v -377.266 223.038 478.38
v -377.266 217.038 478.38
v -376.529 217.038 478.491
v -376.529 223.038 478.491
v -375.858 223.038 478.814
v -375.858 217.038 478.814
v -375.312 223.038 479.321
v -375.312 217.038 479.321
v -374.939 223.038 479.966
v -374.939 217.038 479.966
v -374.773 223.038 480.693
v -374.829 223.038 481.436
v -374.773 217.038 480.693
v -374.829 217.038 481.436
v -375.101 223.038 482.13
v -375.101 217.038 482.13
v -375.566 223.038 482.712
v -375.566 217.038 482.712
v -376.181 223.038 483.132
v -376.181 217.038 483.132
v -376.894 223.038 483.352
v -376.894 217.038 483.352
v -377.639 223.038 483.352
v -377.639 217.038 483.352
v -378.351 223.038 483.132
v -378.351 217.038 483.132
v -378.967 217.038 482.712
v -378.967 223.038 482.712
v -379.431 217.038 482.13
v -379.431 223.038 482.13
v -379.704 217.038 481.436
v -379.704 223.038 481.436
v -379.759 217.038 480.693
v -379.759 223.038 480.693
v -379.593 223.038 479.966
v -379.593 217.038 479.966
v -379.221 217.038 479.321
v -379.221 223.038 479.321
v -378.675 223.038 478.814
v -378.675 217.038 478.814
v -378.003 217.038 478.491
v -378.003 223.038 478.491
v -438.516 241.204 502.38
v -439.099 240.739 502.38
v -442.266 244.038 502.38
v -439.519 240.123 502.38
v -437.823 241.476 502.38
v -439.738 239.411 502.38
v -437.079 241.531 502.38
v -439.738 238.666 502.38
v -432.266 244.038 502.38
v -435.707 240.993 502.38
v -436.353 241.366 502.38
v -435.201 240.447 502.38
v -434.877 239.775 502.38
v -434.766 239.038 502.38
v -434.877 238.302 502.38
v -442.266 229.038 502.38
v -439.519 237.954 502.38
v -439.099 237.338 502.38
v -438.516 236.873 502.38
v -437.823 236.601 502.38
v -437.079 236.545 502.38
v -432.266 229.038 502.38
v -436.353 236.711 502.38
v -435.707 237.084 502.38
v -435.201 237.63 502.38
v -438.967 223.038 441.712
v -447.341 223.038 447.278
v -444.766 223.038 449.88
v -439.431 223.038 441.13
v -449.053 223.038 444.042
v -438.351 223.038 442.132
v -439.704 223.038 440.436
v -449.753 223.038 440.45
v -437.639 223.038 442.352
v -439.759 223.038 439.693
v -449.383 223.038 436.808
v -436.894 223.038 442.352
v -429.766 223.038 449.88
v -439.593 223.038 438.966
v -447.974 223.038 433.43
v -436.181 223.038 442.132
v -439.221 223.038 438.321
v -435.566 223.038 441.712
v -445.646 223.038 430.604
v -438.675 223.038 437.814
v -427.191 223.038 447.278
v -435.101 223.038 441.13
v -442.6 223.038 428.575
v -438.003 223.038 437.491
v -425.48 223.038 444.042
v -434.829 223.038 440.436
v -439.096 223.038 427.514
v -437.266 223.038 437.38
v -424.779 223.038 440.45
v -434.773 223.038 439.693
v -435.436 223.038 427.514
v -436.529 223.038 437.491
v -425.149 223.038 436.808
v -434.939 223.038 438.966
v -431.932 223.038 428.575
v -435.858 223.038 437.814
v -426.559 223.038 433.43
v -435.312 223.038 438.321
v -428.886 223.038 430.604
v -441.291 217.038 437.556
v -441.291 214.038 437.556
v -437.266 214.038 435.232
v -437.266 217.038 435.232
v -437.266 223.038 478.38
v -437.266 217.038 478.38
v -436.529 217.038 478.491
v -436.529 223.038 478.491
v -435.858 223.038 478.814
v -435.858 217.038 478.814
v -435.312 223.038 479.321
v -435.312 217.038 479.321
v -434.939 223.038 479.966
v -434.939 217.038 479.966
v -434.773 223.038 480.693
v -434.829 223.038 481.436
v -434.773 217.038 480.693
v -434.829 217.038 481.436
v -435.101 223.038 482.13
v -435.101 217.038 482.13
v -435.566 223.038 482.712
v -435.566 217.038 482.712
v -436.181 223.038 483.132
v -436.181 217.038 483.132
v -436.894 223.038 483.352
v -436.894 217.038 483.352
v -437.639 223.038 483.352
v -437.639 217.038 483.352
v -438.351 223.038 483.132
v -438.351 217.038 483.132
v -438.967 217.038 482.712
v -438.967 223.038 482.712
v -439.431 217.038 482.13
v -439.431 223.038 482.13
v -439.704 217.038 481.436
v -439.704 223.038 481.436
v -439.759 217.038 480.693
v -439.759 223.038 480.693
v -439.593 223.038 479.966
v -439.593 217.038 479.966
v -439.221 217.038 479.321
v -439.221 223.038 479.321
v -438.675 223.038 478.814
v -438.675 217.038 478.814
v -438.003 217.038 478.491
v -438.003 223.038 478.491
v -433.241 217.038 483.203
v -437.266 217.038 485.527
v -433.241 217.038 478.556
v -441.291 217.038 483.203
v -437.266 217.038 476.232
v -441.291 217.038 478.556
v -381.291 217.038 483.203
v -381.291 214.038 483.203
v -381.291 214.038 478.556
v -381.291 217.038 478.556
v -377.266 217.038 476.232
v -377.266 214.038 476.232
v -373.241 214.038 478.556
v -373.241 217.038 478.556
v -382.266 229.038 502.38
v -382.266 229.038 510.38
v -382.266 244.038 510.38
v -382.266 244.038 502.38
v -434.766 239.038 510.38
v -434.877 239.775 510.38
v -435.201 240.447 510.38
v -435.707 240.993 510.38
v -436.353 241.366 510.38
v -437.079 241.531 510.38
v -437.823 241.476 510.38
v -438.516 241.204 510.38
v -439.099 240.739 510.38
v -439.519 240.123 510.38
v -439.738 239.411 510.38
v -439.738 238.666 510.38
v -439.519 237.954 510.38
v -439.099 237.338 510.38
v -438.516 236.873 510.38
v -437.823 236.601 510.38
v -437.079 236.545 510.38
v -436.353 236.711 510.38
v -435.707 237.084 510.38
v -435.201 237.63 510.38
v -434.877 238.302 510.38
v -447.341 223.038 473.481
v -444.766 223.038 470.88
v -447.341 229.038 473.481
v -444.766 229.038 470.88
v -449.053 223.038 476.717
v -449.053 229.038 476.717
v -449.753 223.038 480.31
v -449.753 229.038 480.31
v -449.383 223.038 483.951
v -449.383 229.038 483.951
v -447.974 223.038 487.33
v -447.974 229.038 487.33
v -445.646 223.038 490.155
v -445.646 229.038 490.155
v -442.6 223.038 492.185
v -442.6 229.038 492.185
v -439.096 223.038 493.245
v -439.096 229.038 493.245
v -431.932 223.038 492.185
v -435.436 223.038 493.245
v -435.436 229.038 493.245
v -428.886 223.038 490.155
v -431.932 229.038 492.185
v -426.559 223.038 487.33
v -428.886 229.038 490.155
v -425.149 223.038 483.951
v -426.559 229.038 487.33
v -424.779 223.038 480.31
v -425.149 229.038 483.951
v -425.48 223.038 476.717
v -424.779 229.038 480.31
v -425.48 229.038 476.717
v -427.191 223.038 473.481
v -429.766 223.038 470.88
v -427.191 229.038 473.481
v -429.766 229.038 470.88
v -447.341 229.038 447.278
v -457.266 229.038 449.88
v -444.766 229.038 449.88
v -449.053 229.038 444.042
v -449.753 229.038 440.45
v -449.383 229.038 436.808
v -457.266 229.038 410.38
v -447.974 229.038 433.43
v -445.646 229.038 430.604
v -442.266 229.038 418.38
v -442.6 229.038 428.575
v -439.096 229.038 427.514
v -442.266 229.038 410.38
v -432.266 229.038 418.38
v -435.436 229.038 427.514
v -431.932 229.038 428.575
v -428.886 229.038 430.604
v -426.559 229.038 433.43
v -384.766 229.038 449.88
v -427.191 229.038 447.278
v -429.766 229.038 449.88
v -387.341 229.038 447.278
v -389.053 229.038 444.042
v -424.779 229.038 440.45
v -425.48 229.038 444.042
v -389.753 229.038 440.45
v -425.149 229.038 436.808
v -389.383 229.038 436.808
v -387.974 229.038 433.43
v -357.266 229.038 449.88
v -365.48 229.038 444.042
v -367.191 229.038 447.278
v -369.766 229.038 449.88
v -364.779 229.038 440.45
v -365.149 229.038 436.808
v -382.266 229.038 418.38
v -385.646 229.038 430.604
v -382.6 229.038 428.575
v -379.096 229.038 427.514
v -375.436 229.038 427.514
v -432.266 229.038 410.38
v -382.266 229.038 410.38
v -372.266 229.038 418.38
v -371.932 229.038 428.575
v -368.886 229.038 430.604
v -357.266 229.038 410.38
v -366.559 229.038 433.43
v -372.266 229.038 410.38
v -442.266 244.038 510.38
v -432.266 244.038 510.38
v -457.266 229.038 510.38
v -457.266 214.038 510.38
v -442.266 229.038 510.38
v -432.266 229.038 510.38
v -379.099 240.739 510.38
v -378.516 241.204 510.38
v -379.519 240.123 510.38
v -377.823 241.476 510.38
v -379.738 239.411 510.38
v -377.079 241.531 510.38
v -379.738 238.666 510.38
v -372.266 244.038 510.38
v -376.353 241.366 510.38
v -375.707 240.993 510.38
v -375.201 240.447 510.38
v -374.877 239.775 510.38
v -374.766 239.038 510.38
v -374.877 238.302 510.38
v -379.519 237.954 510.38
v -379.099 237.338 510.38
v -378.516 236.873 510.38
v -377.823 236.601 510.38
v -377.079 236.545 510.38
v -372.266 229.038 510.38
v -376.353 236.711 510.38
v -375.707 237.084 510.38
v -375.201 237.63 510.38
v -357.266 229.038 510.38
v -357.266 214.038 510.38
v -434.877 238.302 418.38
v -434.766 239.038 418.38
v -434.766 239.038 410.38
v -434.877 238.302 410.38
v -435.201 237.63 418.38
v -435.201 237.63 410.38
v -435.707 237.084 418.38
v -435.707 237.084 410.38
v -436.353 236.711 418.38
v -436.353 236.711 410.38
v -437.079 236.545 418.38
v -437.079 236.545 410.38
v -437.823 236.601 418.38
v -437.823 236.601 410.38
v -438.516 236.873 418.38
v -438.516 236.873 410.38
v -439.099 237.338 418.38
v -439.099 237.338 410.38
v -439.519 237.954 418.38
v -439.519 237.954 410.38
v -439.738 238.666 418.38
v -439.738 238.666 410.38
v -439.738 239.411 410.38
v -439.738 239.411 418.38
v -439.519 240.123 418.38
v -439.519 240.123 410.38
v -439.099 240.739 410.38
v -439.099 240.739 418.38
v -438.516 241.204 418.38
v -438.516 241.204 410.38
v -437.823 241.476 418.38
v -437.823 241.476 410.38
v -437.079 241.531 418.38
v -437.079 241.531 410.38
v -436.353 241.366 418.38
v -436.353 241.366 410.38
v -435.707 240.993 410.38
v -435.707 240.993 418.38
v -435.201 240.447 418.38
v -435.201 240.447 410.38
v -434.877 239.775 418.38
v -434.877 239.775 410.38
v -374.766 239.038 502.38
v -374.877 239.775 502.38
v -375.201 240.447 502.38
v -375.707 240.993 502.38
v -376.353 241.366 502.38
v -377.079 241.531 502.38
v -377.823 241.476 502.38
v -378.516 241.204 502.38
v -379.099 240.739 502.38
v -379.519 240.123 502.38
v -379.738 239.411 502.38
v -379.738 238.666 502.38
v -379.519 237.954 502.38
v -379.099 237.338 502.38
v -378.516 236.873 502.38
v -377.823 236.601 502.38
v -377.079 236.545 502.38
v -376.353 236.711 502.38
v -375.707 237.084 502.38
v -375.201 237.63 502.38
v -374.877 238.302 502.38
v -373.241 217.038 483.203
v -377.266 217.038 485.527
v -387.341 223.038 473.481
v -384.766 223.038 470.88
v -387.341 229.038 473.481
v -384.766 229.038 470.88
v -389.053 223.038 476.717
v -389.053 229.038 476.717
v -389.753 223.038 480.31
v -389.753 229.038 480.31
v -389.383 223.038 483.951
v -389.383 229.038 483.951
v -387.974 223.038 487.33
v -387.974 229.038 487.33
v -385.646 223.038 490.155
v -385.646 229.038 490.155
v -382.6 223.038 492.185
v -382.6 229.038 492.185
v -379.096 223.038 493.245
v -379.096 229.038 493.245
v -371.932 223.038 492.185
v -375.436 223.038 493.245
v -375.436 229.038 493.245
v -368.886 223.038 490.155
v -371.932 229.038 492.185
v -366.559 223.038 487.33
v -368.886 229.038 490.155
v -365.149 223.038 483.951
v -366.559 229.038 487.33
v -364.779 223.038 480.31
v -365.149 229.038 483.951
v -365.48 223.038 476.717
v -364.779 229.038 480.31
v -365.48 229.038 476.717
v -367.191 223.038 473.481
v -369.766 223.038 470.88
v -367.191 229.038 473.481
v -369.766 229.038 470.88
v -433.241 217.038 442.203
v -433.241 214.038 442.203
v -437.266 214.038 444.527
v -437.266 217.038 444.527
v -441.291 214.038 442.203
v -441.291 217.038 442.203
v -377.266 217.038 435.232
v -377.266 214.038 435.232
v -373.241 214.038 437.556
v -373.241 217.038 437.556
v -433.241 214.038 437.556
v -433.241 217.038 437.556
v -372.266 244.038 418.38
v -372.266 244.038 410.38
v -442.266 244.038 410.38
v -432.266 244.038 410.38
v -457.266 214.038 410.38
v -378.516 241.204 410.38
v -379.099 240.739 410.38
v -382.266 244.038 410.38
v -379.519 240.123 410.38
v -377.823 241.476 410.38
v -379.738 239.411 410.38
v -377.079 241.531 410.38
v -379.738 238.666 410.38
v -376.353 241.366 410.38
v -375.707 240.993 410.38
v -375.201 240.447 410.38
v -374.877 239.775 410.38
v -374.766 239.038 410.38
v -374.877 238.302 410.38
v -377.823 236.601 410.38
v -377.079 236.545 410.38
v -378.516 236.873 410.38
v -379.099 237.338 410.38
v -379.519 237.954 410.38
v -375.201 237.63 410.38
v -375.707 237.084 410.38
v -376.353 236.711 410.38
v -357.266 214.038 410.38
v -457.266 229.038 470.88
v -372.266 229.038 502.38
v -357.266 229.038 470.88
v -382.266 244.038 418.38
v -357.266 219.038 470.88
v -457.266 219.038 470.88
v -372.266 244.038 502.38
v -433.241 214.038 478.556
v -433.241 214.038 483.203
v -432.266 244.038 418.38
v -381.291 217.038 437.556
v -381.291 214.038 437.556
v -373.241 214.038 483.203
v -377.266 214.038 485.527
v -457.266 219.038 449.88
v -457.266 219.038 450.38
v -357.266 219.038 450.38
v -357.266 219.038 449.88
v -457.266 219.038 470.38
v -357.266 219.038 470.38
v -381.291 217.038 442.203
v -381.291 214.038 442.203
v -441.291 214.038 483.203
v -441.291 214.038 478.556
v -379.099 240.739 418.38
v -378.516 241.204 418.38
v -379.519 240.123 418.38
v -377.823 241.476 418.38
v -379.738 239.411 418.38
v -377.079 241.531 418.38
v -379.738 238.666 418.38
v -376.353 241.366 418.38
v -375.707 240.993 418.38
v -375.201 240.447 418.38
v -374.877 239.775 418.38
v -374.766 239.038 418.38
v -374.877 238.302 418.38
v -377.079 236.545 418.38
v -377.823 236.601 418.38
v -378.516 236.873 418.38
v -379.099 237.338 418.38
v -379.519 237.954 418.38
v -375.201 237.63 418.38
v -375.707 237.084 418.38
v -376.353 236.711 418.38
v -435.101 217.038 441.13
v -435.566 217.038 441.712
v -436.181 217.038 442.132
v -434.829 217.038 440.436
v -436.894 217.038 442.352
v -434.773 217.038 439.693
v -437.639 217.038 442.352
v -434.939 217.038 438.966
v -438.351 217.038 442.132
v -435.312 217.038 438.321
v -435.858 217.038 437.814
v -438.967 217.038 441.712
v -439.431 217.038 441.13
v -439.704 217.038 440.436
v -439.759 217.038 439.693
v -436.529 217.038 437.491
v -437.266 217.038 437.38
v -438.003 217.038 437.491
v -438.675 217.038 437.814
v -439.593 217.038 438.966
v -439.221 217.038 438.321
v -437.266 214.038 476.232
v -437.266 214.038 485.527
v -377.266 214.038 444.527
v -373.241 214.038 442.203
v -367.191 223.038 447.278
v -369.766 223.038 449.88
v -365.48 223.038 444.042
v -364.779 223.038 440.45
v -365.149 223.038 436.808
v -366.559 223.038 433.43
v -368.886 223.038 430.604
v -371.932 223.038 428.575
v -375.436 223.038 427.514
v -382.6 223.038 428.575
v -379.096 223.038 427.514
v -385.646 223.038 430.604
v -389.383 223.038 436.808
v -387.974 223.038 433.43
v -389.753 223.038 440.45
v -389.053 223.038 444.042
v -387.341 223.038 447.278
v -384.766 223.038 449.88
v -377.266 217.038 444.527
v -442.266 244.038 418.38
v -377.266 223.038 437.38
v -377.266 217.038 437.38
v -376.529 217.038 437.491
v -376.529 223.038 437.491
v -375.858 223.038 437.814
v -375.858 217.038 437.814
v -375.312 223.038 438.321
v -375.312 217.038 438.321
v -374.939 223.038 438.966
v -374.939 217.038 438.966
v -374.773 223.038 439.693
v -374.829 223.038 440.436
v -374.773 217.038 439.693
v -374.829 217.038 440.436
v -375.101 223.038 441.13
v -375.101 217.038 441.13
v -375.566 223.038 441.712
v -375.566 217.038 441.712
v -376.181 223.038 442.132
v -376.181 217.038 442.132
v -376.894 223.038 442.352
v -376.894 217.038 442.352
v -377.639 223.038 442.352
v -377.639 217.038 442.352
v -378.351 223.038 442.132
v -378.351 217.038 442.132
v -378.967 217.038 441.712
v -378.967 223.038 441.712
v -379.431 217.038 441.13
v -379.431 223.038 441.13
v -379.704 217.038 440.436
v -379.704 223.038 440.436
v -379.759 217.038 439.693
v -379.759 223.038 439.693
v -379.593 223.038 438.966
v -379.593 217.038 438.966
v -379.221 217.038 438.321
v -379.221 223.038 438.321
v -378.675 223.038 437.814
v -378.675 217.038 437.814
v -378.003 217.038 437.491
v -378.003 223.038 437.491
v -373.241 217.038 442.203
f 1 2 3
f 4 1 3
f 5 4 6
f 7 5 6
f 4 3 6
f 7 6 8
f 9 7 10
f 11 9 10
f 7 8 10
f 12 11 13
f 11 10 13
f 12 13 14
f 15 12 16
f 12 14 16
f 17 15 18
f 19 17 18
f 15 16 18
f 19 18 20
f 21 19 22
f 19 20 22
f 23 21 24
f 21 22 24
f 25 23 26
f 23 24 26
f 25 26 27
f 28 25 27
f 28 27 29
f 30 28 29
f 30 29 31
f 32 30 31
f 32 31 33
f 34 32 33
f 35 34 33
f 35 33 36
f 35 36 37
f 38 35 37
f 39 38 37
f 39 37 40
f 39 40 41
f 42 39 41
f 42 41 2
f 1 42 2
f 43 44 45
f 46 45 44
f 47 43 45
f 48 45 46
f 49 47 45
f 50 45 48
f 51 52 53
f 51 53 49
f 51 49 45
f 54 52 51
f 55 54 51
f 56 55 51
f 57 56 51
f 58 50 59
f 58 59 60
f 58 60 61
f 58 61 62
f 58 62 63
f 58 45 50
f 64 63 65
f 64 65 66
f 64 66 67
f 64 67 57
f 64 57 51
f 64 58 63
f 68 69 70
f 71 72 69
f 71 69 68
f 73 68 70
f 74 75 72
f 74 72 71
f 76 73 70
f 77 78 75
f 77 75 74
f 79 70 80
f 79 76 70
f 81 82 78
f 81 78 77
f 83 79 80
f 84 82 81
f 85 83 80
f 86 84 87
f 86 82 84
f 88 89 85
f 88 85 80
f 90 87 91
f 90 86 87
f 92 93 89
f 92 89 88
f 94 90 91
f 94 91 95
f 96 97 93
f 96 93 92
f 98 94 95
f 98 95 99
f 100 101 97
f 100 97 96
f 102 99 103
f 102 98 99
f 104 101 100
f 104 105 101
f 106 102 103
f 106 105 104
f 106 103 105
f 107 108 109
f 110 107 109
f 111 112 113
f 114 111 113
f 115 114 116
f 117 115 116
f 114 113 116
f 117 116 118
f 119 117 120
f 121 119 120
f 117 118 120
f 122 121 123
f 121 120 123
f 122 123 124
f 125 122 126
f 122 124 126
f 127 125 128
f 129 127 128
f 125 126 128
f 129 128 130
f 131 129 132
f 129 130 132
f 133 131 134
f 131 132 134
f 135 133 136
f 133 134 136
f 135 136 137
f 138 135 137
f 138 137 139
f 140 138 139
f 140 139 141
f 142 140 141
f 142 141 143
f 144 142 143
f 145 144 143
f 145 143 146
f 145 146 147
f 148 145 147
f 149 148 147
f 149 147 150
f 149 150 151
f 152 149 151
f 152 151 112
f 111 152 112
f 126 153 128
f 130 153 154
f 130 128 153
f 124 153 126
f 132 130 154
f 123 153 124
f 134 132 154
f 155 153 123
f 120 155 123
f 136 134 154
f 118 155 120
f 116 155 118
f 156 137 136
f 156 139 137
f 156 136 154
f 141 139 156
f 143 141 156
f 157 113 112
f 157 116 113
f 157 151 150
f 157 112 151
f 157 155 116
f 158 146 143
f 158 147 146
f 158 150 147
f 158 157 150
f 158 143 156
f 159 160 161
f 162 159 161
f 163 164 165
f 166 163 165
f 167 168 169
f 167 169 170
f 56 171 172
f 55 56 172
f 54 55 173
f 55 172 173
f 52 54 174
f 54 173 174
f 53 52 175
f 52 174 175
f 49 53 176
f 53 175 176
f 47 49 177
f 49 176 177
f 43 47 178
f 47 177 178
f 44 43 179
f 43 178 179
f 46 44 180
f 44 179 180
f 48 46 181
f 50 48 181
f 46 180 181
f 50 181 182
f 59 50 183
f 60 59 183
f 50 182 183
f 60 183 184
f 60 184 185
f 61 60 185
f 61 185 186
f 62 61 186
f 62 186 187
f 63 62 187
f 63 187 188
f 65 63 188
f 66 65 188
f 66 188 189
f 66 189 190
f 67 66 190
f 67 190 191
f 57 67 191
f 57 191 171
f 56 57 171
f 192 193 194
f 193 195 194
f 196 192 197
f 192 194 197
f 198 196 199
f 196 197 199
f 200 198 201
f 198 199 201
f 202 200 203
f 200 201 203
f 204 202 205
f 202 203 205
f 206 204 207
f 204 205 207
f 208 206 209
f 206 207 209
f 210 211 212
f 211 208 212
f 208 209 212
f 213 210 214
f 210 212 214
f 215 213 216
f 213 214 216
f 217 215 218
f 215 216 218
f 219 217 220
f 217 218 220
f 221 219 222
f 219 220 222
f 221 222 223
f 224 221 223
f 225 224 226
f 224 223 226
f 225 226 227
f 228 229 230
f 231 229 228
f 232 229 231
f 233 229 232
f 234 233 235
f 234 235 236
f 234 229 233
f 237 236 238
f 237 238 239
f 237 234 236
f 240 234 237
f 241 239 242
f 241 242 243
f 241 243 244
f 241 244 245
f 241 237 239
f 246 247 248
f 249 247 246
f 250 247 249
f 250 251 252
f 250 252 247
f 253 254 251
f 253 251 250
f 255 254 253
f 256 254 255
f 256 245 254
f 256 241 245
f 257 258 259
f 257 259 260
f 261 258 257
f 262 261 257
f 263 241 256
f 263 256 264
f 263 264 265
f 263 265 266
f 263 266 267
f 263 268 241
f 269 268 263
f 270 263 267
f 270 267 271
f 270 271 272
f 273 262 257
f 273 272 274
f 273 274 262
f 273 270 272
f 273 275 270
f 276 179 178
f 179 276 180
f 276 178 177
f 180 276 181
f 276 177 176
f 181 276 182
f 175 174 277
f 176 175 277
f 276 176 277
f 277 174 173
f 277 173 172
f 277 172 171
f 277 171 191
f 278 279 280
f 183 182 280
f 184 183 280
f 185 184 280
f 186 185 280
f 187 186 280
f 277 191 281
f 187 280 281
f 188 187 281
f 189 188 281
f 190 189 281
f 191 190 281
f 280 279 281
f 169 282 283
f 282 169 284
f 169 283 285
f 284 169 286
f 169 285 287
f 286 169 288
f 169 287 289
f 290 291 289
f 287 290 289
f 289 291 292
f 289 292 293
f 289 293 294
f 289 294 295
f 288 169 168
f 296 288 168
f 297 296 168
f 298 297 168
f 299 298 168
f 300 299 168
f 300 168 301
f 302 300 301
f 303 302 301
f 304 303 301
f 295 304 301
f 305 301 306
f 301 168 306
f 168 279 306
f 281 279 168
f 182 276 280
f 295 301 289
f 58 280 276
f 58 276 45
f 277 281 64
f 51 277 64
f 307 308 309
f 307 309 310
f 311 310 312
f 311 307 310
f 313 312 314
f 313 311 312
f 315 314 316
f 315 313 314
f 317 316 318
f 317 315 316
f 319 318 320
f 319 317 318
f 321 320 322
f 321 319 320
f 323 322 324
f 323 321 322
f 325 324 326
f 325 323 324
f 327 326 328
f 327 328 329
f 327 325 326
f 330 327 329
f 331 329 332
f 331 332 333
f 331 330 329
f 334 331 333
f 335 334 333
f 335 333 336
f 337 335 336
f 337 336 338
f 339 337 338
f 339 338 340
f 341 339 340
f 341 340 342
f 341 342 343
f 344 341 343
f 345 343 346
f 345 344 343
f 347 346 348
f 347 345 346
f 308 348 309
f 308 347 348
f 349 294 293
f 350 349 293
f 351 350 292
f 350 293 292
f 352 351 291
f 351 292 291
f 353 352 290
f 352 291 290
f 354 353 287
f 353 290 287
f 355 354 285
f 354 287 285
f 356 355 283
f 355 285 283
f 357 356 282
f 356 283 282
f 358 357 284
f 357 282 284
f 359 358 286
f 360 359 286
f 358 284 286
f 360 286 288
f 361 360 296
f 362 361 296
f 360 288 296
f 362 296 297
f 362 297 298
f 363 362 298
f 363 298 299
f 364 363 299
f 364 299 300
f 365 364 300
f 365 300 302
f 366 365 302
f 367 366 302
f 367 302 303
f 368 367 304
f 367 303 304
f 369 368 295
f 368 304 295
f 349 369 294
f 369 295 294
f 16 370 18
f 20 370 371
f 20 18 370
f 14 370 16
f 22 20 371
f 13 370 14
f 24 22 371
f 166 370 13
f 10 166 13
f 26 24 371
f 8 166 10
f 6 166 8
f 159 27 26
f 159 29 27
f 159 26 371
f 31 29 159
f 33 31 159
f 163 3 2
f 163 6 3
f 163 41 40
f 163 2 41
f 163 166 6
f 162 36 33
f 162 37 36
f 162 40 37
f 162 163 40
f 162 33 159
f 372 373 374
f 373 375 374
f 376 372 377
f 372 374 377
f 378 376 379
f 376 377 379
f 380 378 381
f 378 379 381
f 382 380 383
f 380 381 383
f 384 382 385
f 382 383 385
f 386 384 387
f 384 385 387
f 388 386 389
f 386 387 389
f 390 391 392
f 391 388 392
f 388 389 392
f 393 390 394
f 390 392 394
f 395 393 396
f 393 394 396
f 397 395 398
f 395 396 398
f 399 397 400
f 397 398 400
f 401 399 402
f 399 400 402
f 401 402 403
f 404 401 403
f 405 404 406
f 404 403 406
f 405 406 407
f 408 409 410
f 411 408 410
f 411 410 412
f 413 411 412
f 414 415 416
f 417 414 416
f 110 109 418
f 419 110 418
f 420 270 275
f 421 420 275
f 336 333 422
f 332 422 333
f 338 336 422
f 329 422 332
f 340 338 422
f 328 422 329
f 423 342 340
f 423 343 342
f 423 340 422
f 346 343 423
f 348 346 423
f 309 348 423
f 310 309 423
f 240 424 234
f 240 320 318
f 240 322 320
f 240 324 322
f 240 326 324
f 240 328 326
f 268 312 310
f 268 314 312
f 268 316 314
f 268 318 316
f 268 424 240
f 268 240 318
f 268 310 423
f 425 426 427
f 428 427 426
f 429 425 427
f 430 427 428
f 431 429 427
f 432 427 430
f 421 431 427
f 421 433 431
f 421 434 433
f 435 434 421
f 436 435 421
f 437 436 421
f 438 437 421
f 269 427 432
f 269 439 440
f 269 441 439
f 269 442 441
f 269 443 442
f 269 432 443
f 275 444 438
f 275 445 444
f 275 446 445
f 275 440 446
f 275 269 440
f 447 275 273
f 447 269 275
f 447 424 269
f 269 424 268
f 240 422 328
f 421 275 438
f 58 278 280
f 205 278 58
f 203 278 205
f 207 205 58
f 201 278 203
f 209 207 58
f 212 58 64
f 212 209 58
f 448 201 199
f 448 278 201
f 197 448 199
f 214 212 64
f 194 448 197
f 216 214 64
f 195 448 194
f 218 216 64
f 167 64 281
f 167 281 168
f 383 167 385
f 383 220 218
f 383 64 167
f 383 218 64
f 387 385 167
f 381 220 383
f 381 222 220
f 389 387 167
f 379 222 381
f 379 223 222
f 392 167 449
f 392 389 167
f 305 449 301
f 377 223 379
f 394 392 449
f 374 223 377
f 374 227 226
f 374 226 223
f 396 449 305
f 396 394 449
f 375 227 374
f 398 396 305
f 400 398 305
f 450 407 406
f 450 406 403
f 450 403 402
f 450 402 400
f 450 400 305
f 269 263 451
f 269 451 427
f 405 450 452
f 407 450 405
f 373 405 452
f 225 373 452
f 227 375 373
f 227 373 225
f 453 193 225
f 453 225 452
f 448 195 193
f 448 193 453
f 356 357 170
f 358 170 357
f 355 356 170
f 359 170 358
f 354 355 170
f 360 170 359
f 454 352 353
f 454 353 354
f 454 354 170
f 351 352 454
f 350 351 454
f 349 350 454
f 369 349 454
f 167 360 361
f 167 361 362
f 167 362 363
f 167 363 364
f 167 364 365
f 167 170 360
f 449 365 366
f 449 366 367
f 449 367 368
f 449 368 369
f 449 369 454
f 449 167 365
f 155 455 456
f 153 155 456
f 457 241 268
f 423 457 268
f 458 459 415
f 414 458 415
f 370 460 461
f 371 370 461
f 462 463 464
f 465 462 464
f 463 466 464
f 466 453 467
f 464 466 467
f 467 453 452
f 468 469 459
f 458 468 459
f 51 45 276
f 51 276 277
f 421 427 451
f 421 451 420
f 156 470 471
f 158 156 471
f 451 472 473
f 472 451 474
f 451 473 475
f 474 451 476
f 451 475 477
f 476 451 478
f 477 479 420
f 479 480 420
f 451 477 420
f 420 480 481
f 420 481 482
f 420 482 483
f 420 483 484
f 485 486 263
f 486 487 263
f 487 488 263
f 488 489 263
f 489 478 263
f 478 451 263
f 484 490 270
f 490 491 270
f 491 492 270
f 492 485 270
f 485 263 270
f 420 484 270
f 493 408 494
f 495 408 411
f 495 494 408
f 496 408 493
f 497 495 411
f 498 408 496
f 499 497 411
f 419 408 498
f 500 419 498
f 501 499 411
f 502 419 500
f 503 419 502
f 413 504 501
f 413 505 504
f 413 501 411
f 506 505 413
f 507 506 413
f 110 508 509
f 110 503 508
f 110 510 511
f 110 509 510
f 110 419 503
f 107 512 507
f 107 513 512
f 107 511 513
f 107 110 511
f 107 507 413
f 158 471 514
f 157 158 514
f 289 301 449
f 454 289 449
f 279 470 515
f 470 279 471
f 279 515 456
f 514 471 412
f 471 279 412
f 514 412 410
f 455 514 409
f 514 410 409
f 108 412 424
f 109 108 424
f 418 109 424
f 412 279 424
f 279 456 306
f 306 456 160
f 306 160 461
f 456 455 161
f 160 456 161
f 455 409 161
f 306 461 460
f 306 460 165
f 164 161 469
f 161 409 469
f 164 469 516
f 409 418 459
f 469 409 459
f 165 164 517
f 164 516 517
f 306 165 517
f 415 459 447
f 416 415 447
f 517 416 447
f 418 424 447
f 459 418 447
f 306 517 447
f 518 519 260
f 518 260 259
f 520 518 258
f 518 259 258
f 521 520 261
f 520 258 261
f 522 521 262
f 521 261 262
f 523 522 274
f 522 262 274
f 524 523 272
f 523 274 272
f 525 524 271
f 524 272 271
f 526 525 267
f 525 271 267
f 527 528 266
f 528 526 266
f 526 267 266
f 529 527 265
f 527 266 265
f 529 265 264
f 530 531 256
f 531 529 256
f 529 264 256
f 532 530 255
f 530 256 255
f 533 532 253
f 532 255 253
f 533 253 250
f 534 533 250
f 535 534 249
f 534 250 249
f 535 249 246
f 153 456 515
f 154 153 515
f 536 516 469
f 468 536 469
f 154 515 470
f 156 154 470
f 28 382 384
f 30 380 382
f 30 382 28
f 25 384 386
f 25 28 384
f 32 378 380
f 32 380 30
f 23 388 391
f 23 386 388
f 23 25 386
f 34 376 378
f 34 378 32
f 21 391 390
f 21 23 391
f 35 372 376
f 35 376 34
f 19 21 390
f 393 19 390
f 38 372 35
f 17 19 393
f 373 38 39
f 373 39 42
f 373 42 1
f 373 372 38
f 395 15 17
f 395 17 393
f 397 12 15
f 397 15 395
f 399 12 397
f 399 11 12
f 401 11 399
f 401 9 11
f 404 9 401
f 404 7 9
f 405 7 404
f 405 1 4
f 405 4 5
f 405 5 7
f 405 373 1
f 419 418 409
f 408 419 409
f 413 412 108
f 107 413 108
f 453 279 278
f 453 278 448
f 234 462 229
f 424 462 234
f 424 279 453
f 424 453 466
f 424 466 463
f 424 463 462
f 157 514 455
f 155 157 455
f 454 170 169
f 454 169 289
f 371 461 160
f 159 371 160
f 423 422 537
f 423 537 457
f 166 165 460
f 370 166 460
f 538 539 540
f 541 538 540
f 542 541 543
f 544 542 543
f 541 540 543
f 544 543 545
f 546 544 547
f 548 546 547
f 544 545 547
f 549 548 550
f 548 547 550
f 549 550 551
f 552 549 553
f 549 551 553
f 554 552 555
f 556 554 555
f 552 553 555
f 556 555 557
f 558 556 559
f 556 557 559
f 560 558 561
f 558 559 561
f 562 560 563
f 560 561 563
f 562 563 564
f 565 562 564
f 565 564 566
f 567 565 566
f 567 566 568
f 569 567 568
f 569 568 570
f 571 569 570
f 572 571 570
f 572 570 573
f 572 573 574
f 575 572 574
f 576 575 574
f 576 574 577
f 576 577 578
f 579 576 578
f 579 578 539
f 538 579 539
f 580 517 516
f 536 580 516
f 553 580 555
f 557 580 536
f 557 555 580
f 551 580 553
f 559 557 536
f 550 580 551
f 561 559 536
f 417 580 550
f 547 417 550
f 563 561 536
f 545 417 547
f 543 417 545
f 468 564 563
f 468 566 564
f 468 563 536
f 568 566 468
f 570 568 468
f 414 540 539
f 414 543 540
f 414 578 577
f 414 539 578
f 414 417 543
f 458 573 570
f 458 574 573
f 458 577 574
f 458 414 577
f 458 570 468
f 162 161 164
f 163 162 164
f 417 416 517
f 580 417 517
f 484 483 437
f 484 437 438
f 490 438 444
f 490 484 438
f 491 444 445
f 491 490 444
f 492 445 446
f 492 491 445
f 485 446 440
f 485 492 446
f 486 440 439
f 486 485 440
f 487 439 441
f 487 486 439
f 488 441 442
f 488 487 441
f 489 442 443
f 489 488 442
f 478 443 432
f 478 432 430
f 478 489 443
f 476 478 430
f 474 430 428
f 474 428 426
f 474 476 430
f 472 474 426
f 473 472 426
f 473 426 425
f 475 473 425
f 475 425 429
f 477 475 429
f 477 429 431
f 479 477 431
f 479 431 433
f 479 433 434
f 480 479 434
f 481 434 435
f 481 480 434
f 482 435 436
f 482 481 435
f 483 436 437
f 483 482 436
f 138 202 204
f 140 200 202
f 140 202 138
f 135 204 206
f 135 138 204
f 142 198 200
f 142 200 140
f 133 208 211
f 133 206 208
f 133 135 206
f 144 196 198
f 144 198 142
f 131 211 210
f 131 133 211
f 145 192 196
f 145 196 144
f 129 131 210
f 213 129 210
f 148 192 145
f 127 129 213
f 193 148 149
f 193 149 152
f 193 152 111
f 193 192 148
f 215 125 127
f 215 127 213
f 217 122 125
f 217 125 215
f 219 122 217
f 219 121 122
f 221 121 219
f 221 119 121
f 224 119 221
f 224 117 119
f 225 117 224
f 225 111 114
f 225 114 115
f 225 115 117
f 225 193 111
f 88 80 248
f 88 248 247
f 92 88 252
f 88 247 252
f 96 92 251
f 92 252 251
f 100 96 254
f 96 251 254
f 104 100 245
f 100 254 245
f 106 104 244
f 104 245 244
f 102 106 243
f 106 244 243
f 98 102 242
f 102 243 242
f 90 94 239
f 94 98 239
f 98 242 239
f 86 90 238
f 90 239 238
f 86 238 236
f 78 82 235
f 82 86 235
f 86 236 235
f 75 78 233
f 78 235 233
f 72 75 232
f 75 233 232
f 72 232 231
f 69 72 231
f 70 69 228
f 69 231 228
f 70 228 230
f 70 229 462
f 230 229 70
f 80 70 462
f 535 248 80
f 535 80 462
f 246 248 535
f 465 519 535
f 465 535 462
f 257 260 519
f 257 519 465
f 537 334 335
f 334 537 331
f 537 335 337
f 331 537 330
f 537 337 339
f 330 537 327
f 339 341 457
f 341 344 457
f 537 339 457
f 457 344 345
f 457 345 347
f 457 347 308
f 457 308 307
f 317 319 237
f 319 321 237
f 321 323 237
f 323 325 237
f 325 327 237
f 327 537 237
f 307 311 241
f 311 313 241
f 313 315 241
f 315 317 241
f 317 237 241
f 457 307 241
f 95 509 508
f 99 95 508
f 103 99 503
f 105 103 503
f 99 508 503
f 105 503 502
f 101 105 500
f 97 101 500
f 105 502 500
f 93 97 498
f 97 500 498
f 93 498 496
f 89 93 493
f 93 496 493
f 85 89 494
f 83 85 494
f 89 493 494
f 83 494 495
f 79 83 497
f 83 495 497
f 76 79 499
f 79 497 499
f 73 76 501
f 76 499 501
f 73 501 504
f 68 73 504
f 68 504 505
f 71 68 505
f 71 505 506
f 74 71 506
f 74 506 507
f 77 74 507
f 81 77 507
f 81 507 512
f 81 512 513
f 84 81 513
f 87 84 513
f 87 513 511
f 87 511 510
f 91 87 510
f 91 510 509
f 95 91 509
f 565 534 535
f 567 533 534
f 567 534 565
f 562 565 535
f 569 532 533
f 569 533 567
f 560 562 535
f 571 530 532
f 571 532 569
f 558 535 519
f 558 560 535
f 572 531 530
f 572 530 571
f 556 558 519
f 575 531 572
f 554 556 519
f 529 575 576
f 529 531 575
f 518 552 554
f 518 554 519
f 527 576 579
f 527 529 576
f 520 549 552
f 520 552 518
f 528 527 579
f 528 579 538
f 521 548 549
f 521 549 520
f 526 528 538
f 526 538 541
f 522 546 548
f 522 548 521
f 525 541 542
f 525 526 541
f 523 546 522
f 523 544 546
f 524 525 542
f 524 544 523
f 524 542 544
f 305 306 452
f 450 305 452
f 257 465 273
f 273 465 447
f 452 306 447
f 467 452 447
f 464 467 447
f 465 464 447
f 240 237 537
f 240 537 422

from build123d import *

# Parameters (mm, degrees)
SKETCH1_W           = 1000
SKETCH1_H           = 1000
BOSS_EXTRUDE1_DEPTH = 300
SKETCH2_W           = 1000
SKETCH2_H           = 200
CUT_EXTRUDE1_DEPTH  = 100
MOVE_FACE1_BY       = 150
SCALE1_SCALE        = 0.1
SKETCH5_R           = 12.5
CUT_EXTRUDE4_DEPTH  = 6
SKETCH11_R          = 12.5
CUT_EXTRUDE5_DEPTH  = 6
SKETCH12_R          = 12.5
CUT_EXTRUDE6_DEPTH  = 6
SKETCH13_R          = 12.5
CUT_EXTRUDE7_DEPTH  = 6
CUT_EXTRUDE8_DEPTH  = 3
SKETCH15_R          = 2.5
CUT_EXTRUDE9_DEPTH  = 16
CUT_EXTRUDE10_DEPTH = 3
SKETCH17_R          = 2.5
CUT_EXTRUDE11_DEPTH = 10
CUT_EXTRUDE12_DEPTH = 3
SKETCH19_R          = 2.5
CUT_EXTRUDE13_DEPTH = 10
CUT_EXTRUDE14_DEPTH = 3
SKETCH21_R          = 2.5
CUT_EXTRUDE15_DEPTH = 10
SKETCH27_W          = 10
SKETCH27_H          = 8
BOSS_EXTRUDE3_DEPTH = 15
CUT_EXTRUDE21_REACH = 529.87
SKETCH28_R          = 2.5
SKETCH30_W          = 10
SKETCH30_H          = 8
BOSS_EXTRUDE4_DEPTH = 15
SKETCH31_R          = 2.5
CUT_EXTRUDE22_DEPTH = 8
SKETCH32_W          = 10
SKETCH32_H          = 8
BOSS_EXTRUDE5_DEPTH = 15
CUT_EXTRUDE23_START = -8
SKETCH33_R          = 2.5
CUT_EXTRUDE23_DEPTH = 8
SKETCH34_W          = 10
SKETCH34_H          = 8
BOSS_EXTRUDE6_DEPTH = 15
CUT_EXTRUDE24_START = -8
SKETCH35_R          = 2.5
CUT_EXTRUDE24_DEPTH = 8
SKETCH40_W          = 100
SKETCH40_H          = 10
CUT_EXTRUDE25_DEPTH = 0.5
SKETCH41_W          = 100
SKETCH41_H          = 10
CUT_EXTRUDE26_DEPTH = 0.5


with BuildPart() as part:
    # Sketch1 → Boss-Extrude1 (new body)
    with BuildSketch(Plane(origin=(0, 0, 0), x_dir=(1, 0, 0), z_dir=(0, 1, 0))):
        with Locations((-407.266206583, -460.379609426)):
            Rectangle(SKETCH1_W, SKETCH1_H)
    extrude(amount=BOSS_EXTRUDE1_DEPTH)

    # Sketch2 → Cut-Extrude1 (cut)
    with BuildSketch(Plane(origin=(0, 300, 0), x_dir=(1, 0, 0), z_dir=(0, 1, 0))):
        with Locations((-407.266206583, -460.379609426)):
            Rectangle(SKETCH2_W, SKETCH2_H)
    extrude(amount=-CUT_EXTRUDE1_DEPTH, mode=Mode.SUBTRACT)

    # Move Face1: a face moved inward by 150.0
    extrude(part.faces().sort_by_distance((-407.266206583, 0, 460.379609426))[0], amount=MOVE_FACE1_BY, dir=(0, 1, 0), mode=Mode.SUBTRACT)


with BuildPart() as part_1:
    # Scale1: scaled about (-407.266206583, 221.153846154, 460.379609426)
    add(part.part.scale(SCALE1_SCALE).moved(Location((-366.539585925, 199.038461539, 414.341648483))))

    # Sketch5 → Cut-Extrude4 (cut)
    with BuildSketch(Plane(origin=(0, 229.038461538, 0), x_dir=(1, 0, 0), z_dir=(0, 1, 0))):
        with Locations((-437.266206583, -439.879609426)):
            Circle(SKETCH5_R)
    extrude(amount=-CUT_EXTRUDE4_DEPTH, mode=Mode.SUBTRACT)

    # Sketch11 → Cut-Extrude5 (cut)
    with BuildSketch(Plane(origin=(0, 229.038461538, 0), x_dir=(1, 0, 0), z_dir=(0, 1, 0))):
        with Locations((-377.266206583, -439.879609426)):
            Circle(SKETCH11_R)
    extrude(amount=-CUT_EXTRUDE5_DEPTH, mode=Mode.SUBTRACT)

    # Sketch12 → Cut-Extrude6 (cut)
    with BuildSketch(Plane(origin=(0, 229.038461538, 0), x_dir=(1, 0, 0), z_dir=(0, 1, 0))):
        with Locations((-377.266206583, -480.879609426)):
            Circle(SKETCH12_R)
    extrude(amount=-CUT_EXTRUDE6_DEPTH, mode=Mode.SUBTRACT)

    # Sketch13 → Cut-Extrude7 (cut)
    with BuildSketch(Plane(origin=(0, 229.038461538, 0), x_dir=(1, 0, 0), z_dir=(0, 1, 0))):
        with Locations((-437.266206583, -480.879609426)):
            Circle(SKETCH13_R)
    extrude(amount=-CUT_EXTRUDE7_DEPTH, mode=Mode.SUBTRACT)

    # Sketch14 → Cut-Extrude8 (cut)
    with BuildSketch(Plane(origin=(0, 214.038461538, 0), x_dir=(-1, 0, 0), z_dir=(0, -1, 0))):
        Polygon((377.266206583, -444.527279093), (381.291206583, -442.20344426), (381.291206583, -437.555774593), (377.266206583, -435.231939759), (373.241206583, -437.555774593), (373.241206583, -442.20344426), align=None)
    extrude(amount=-CUT_EXTRUDE8_DEPTH, mode=Mode.SUBTRACT)

    # Sketch15 → Cut-Extrude9 (cut)
    with BuildSketch(Plane(origin=(0, 217.038461538, 0), x_dir=(-1, 0, 0), z_dir=(0, -1, 0))):
        with Locations(Location((377.266206583, -439.879609426, 0), (0, 0, 90))):
            Circle(SKETCH15_R)
    extrude(amount=-CUT_EXTRUDE9_DEPTH, mode=Mode.SUBTRACT)

    # Sketch16 → Cut-Extrude10 (cut)
    with BuildSketch(Plane(origin=(0, 214.038461538, 0), x_dir=(-1, 0, 0), z_dir=(0, -1, 0))):
        Polygon((437.266206583, -444.527279093), (441.291206583, -442.20344426), (441.291206583, -437.555774593), (437.266206583, -435.231939759), (433.241206583, -437.555774593), (433.241206583, -442.20344426), align=None)
    extrude(amount=-CUT_EXTRUDE10_DEPTH, mode=Mode.SUBTRACT)

    # Sketch17 → Cut-Extrude11 (cut)
    with BuildSketch(Plane(origin=(0, 217.038461538, 0), x_dir=(-1, 0, 0), z_dir=(0, -1, 0))):
        with Locations(Location((437.266206583, -439.879609426, 0), (0, 0, 90))):
            Circle(SKETCH17_R)
    extrude(amount=-CUT_EXTRUDE11_DEPTH, mode=Mode.SUBTRACT)

    # Sketch18 → Cut-Extrude12 (cut)
    with BuildSketch(Plane(origin=(0, 214.038461538, 0), x_dir=(-1, 0, 0), z_dir=(0, -1, 0))):
        Polygon((377.266206583, -485.527279093), (381.291206583, -483.20344426), (381.291206583, -478.555774593), (377.266206583, -476.231939759), (373.241206583, -478.555774593), (373.241206583, -483.20344426), align=None)
    extrude(amount=-CUT_EXTRUDE12_DEPTH, mode=Mode.SUBTRACT)

    # Sketch19 → Cut-Extrude13 (cut)
    with BuildSketch(Plane(origin=(0, 217.038461538, 0), x_dir=(-1, 0, 0), z_dir=(0, -1, 0))):
        with Locations(Location((377.266206583, -480.879609426, 0), (0, 0, 90))):
            Circle(SKETCH19_R)
    extrude(amount=-CUT_EXTRUDE13_DEPTH, mode=Mode.SUBTRACT)

    # Sketch20 → Cut-Extrude14 (cut)
    with BuildSketch(Plane(origin=(0, 214.038461538, 0), x_dir=(-1, 0, 0), z_dir=(0, -1, 0))):
        Polygon((437.266206583, -485.527279093), (441.291206583, -483.20344426), (441.291206583, -478.555774593), (437.266206583, -476.231939759), (433.241206583, -478.555774593), (433.241206583, -483.20344426), align=None)
    extrude(amount=-CUT_EXTRUDE14_DEPTH, mode=Mode.SUBTRACT)

    # Sketch21 → Cut-Extrude15 (cut)
    with BuildSketch(Plane(origin=(0, 217.038461538, 0), x_dir=(-1, 0, 0), z_dir=(0, -1, 0))):
        with Locations(Location((437.266206583, -480.879609426, 0), (0, 0, 90))):
            Circle(SKETCH21_R)
    extrude(amount=-CUT_EXTRUDE15_DEPTH, mode=Mode.SUBTRACT)

    # Sketch27 → Boss-Extrude3 (add)
    with BuildSketch(Plane(origin=(0, 229.038461538, 0), x_dir=(1, 0, 0), z_dir=(0, 1, 0))):
        with Locations((-437.266206583, -506.379609426)):
            Rectangle(SKETCH27_W, SKETCH27_H)
    extrude(amount=BOSS_EXTRUDE3_DEPTH)

    # Sketch28 → Cut-Extrude21 (cut, up to next)
    with BuildSketch(Plane.XY.offset(510.379609426), mode=Mode.PRIVATE) as cut_extrude21_sk1:
        with Locations((-437.266206583, 239.038461538)):
            Circle(SKETCH28_R)
    cut_extrude21_tool1 = extrude(cut_extrude21_sk1.sketch, amount=-CUT_EXTRUDE21_REACH, mode=Mode.PRIVATE) & part_1.part
    add(cut_extrude21_tool1.solids().sort_by_distance((-437.266207, 239.038462, 510.379609))[0], mode=Mode.SUBTRACT)

    # Sketch30 → Boss-Extrude4 (add)
    with BuildSketch(Plane(origin=(0, 229.038461538, 0), x_dir=(1, 0, 0), z_dir=(0, 1, 0))):
        with Locations((-377.266206583, -506.379609426)):
            Rectangle(SKETCH30_W, SKETCH30_H)
    extrude(amount=BOSS_EXTRUDE4_DEPTH)

    # Sketch31 → Cut-Extrude22 (cut)
    with BuildSketch(Plane.XY.offset(510.379609426)):
        with Locations((-377.266206583, 239.038461538)):
            Circle(SKETCH31_R)
    extrude(amount=-CUT_EXTRUDE22_DEPTH, mode=Mode.SUBTRACT)

    # Sketch32 → Boss-Extrude5 (add)
    with BuildSketch(Plane(origin=(0, 229.038461538, 0), x_dir=(1, 0, 0), z_dir=(0, 1, 0))):
        with Locations((-437.266206583, -414.379609426)):
            Rectangle(SKETCH32_W, SKETCH32_H)
    extrude(amount=BOSS_EXTRUDE5_DEPTH)

    # Sketch33 → Cut-Extrude23 (cut)
    with BuildSketch(Plane(origin=(0, 0, 410.379609426), x_dir=(-1, 0, 0), z_dir=(0, 0, -1)).offset(CUT_EXTRUDE23_START)):
        with Locations(Location((437.266206583, 239.038461538, 0), (0, 0, 180))):
            Circle(SKETCH33_R)
    extrude(amount=CUT_EXTRUDE23_DEPTH, mode=Mode.SUBTRACT)

    # Sketch34 → Boss-Extrude6 (add)
    with BuildSketch(Plane(origin=(0, 229.038461538, 0), x_dir=(1, 0, 0), z_dir=(0, 1, 0))):
        with Locations((-377.266206583, -414.379609426)):
            Rectangle(SKETCH34_W, SKETCH34_H)
    extrude(amount=BOSS_EXTRUDE6_DEPTH)

    # Sketch35 → Cut-Extrude24 (cut)
    with BuildSketch(Plane(origin=(0, 0, 410.379609426), x_dir=(-1, 0, 0), z_dir=(0, 0, -1)).offset(CUT_EXTRUDE24_START)):
        with Locations(Location((377.266206583, 239.038461538, 0), (0, 0, 180))):
            Circle(SKETCH35_R)
    extrude(amount=CUT_EXTRUDE24_DEPTH, mode=Mode.SUBTRACT)

    # Sketch40 → Cut-Extrude25 (cut)
    with BuildSketch(Plane(origin=(0, 0, 470.379609426), x_dir=(-1, 0, 0), z_dir=(0, 0, -1))):
        with Locations((407.266206583, 224.038461538)):
            Rectangle(SKETCH40_W, SKETCH40_H)
    extrude(amount=-CUT_EXTRUDE25_DEPTH, mode=Mode.SUBTRACT)

    # Sketch41 → Cut-Extrude26 (cut)
    with BuildSketch(Plane.XY.offset(450.379609426)):
        with Locations((-407.266206583, 224.038461538)):
            Rectangle(SKETCH41_W, SKETCH41_H)
    extrude(amount=-CUT_EXTRUDE26_DEPTH, mode=Mode.SUBTRACT)


solid = part_1.part
